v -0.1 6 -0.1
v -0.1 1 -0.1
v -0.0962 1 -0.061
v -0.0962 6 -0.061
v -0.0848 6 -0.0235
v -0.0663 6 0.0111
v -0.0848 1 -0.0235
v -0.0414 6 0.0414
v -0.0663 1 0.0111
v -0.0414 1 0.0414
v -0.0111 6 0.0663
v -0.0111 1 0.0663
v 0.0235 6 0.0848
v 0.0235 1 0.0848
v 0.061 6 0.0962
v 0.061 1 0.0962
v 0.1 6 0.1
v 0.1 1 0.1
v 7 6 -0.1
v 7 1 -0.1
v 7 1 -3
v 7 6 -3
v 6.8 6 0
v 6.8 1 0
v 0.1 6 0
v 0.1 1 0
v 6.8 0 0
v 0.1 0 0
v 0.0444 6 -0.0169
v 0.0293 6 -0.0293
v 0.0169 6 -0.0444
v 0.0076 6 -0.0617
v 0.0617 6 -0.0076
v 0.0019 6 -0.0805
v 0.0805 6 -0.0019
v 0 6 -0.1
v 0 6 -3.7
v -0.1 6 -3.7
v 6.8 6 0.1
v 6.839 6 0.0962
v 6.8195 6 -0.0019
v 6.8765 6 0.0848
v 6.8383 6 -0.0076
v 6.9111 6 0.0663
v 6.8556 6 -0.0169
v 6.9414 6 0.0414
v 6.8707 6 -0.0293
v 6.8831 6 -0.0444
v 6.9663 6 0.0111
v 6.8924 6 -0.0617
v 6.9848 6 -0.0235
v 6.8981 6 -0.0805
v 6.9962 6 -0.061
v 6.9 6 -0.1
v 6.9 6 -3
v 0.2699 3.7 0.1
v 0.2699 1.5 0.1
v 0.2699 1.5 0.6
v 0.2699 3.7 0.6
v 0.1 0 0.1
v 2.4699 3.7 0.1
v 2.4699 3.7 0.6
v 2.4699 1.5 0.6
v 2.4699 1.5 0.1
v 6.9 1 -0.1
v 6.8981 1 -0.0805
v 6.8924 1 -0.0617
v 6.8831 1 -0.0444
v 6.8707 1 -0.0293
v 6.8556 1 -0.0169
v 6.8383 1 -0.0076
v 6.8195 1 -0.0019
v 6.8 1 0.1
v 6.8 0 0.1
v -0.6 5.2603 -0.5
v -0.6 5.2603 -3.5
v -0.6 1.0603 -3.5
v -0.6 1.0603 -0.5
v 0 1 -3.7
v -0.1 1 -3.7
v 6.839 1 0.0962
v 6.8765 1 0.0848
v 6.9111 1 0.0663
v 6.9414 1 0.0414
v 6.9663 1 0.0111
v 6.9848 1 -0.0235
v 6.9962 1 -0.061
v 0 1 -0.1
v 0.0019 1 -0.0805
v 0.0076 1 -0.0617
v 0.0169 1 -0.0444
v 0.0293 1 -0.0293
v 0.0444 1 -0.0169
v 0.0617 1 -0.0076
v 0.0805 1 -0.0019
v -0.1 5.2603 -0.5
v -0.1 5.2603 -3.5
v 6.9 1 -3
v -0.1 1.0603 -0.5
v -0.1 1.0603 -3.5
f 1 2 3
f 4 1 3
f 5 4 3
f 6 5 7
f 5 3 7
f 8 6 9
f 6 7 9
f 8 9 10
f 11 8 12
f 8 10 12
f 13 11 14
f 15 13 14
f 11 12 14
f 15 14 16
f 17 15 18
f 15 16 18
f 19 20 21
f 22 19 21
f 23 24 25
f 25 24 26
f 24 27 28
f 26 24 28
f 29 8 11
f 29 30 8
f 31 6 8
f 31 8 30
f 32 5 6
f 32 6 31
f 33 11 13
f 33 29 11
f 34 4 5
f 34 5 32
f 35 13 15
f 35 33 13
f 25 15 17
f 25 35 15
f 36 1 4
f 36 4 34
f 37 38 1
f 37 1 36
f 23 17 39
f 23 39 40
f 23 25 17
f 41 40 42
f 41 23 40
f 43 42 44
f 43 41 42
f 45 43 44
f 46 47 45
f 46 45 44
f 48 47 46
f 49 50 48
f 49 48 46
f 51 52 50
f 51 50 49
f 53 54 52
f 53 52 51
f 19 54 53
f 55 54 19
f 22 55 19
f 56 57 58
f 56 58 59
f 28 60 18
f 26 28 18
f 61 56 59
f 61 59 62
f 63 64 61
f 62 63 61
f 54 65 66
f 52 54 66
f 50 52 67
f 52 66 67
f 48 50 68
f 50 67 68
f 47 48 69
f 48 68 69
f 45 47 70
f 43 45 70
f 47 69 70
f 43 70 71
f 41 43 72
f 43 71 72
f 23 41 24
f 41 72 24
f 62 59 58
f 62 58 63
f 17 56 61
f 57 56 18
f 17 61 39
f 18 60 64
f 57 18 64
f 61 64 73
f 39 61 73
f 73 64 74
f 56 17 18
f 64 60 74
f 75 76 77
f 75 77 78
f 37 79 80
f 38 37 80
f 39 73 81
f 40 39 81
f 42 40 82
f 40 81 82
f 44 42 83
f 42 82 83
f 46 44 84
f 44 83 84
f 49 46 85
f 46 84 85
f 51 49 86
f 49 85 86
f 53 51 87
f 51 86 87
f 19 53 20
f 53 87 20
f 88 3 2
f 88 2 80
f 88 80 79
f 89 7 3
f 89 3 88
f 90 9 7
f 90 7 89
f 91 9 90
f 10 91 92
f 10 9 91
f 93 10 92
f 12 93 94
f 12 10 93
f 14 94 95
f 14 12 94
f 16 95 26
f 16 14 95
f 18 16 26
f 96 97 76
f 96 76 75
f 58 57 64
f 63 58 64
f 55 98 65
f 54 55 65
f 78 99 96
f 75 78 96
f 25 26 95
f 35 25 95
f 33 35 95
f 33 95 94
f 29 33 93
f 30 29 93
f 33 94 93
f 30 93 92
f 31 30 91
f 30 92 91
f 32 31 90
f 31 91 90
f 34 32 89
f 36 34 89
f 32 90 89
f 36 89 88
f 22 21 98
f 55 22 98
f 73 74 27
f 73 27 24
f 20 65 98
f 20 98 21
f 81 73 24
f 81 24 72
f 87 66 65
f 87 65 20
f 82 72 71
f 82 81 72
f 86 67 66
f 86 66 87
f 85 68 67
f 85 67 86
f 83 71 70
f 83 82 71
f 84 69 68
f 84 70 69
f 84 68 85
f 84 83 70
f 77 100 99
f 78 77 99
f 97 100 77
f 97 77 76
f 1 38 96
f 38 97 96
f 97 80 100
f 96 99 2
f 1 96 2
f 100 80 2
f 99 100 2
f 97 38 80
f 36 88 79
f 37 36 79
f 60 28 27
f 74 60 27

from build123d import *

# Parameters (mm, degrees)
BASE_FLANGE3_DEPTH  = 6
SKETCH14_W          = 0.2
SKETCH14_H          = 1
CUT_EXTRUDE1_DEPTH  = 10.97196069
SKETCH15_W          = 2.2
SKETCH15_H          = 2.2
BOSS_EXTRUDE1_DEPTH = 0.5
SKETCH16_W          = 3
SKETCH16_H          = 4.2
BOSS_EXTRUDE2_DEPTH = 0.5


# Sheet-metal steps are written as plain solids
with BuildPart() as part:
    # Sketch1 → Base-Flange3 (new body)
    with BuildSketch(Plane(origin=(0, 0, 0), x_dir=(1, 0, 0), z_dir=(0, 1, 0))):
        with BuildLine():
            Line((6.9, 3), (6.9, 0.1))
            ThreePointArc((6.9, 0.1), (6.870710678, 0.029289322), (6.8, 0))
            Line((6.8, 0), (0.1, 0))
            ThreePointArc((0.1, 0), (0.029289322, 0.029289322), (0, 0.1))
            Line((0, 0.1), (0, 3.7))
            Line((0, 3.7), (-0.1, 3.7))
            Line((-0.1, 3.7), (-0.1, 0.1))
            ThreePointArc((-0.1, 0.1), (-0.041421356, -0.041421356), (0.1, -0.1))
            Line((0.1, -0.1), (6.8, -0.1))
            ThreePointArc((6.8, -0.1), (6.941421356, -0.041421356), (7, 0.1))
            Line((7, 0.1), (7, 3))
            Line((7, 3), (6.9, 3))
        make_face()
    extrude(amount=BASE_FLANGE3_DEPTH)

    # Sketch14 → Cut-Extrude1 (cut, through all)
    with BuildSketch(Plane.XY.offset(0.1)):
        with Locations((0, 0.5)):
            Rectangle(SKETCH14_W, SKETCH14_H)
        with Locations((6.9, 0.5)):
            Rectangle(SKETCH14_W, SKETCH14_H)
    extrude(amount=-CUT_EXTRUDE1_DEPTH, mode=Mode.SUBTRACT)

    # Sketch15 → Boss-Extrude1 (add)
    with BuildSketch(Plane.XY.offset(0.1)):
        with Locations((1.369926131, 2.6)):
            Rectangle(SKETCH15_W, SKETCH15_H)
    extrude(amount=BOSS_EXTRUDE1_DEPTH)

    # Sketch16 → Boss-Extrude2 (add)
    with BuildSketch(Plane.ZY.offset(0.1)):
        with Locations((-2, 3.160264221)):
            Rectangle(SKETCH16_W, SKETCH16_H)
    extrude(amount=BOSS_EXTRUDE2_DEPTH)


solid = part.part
